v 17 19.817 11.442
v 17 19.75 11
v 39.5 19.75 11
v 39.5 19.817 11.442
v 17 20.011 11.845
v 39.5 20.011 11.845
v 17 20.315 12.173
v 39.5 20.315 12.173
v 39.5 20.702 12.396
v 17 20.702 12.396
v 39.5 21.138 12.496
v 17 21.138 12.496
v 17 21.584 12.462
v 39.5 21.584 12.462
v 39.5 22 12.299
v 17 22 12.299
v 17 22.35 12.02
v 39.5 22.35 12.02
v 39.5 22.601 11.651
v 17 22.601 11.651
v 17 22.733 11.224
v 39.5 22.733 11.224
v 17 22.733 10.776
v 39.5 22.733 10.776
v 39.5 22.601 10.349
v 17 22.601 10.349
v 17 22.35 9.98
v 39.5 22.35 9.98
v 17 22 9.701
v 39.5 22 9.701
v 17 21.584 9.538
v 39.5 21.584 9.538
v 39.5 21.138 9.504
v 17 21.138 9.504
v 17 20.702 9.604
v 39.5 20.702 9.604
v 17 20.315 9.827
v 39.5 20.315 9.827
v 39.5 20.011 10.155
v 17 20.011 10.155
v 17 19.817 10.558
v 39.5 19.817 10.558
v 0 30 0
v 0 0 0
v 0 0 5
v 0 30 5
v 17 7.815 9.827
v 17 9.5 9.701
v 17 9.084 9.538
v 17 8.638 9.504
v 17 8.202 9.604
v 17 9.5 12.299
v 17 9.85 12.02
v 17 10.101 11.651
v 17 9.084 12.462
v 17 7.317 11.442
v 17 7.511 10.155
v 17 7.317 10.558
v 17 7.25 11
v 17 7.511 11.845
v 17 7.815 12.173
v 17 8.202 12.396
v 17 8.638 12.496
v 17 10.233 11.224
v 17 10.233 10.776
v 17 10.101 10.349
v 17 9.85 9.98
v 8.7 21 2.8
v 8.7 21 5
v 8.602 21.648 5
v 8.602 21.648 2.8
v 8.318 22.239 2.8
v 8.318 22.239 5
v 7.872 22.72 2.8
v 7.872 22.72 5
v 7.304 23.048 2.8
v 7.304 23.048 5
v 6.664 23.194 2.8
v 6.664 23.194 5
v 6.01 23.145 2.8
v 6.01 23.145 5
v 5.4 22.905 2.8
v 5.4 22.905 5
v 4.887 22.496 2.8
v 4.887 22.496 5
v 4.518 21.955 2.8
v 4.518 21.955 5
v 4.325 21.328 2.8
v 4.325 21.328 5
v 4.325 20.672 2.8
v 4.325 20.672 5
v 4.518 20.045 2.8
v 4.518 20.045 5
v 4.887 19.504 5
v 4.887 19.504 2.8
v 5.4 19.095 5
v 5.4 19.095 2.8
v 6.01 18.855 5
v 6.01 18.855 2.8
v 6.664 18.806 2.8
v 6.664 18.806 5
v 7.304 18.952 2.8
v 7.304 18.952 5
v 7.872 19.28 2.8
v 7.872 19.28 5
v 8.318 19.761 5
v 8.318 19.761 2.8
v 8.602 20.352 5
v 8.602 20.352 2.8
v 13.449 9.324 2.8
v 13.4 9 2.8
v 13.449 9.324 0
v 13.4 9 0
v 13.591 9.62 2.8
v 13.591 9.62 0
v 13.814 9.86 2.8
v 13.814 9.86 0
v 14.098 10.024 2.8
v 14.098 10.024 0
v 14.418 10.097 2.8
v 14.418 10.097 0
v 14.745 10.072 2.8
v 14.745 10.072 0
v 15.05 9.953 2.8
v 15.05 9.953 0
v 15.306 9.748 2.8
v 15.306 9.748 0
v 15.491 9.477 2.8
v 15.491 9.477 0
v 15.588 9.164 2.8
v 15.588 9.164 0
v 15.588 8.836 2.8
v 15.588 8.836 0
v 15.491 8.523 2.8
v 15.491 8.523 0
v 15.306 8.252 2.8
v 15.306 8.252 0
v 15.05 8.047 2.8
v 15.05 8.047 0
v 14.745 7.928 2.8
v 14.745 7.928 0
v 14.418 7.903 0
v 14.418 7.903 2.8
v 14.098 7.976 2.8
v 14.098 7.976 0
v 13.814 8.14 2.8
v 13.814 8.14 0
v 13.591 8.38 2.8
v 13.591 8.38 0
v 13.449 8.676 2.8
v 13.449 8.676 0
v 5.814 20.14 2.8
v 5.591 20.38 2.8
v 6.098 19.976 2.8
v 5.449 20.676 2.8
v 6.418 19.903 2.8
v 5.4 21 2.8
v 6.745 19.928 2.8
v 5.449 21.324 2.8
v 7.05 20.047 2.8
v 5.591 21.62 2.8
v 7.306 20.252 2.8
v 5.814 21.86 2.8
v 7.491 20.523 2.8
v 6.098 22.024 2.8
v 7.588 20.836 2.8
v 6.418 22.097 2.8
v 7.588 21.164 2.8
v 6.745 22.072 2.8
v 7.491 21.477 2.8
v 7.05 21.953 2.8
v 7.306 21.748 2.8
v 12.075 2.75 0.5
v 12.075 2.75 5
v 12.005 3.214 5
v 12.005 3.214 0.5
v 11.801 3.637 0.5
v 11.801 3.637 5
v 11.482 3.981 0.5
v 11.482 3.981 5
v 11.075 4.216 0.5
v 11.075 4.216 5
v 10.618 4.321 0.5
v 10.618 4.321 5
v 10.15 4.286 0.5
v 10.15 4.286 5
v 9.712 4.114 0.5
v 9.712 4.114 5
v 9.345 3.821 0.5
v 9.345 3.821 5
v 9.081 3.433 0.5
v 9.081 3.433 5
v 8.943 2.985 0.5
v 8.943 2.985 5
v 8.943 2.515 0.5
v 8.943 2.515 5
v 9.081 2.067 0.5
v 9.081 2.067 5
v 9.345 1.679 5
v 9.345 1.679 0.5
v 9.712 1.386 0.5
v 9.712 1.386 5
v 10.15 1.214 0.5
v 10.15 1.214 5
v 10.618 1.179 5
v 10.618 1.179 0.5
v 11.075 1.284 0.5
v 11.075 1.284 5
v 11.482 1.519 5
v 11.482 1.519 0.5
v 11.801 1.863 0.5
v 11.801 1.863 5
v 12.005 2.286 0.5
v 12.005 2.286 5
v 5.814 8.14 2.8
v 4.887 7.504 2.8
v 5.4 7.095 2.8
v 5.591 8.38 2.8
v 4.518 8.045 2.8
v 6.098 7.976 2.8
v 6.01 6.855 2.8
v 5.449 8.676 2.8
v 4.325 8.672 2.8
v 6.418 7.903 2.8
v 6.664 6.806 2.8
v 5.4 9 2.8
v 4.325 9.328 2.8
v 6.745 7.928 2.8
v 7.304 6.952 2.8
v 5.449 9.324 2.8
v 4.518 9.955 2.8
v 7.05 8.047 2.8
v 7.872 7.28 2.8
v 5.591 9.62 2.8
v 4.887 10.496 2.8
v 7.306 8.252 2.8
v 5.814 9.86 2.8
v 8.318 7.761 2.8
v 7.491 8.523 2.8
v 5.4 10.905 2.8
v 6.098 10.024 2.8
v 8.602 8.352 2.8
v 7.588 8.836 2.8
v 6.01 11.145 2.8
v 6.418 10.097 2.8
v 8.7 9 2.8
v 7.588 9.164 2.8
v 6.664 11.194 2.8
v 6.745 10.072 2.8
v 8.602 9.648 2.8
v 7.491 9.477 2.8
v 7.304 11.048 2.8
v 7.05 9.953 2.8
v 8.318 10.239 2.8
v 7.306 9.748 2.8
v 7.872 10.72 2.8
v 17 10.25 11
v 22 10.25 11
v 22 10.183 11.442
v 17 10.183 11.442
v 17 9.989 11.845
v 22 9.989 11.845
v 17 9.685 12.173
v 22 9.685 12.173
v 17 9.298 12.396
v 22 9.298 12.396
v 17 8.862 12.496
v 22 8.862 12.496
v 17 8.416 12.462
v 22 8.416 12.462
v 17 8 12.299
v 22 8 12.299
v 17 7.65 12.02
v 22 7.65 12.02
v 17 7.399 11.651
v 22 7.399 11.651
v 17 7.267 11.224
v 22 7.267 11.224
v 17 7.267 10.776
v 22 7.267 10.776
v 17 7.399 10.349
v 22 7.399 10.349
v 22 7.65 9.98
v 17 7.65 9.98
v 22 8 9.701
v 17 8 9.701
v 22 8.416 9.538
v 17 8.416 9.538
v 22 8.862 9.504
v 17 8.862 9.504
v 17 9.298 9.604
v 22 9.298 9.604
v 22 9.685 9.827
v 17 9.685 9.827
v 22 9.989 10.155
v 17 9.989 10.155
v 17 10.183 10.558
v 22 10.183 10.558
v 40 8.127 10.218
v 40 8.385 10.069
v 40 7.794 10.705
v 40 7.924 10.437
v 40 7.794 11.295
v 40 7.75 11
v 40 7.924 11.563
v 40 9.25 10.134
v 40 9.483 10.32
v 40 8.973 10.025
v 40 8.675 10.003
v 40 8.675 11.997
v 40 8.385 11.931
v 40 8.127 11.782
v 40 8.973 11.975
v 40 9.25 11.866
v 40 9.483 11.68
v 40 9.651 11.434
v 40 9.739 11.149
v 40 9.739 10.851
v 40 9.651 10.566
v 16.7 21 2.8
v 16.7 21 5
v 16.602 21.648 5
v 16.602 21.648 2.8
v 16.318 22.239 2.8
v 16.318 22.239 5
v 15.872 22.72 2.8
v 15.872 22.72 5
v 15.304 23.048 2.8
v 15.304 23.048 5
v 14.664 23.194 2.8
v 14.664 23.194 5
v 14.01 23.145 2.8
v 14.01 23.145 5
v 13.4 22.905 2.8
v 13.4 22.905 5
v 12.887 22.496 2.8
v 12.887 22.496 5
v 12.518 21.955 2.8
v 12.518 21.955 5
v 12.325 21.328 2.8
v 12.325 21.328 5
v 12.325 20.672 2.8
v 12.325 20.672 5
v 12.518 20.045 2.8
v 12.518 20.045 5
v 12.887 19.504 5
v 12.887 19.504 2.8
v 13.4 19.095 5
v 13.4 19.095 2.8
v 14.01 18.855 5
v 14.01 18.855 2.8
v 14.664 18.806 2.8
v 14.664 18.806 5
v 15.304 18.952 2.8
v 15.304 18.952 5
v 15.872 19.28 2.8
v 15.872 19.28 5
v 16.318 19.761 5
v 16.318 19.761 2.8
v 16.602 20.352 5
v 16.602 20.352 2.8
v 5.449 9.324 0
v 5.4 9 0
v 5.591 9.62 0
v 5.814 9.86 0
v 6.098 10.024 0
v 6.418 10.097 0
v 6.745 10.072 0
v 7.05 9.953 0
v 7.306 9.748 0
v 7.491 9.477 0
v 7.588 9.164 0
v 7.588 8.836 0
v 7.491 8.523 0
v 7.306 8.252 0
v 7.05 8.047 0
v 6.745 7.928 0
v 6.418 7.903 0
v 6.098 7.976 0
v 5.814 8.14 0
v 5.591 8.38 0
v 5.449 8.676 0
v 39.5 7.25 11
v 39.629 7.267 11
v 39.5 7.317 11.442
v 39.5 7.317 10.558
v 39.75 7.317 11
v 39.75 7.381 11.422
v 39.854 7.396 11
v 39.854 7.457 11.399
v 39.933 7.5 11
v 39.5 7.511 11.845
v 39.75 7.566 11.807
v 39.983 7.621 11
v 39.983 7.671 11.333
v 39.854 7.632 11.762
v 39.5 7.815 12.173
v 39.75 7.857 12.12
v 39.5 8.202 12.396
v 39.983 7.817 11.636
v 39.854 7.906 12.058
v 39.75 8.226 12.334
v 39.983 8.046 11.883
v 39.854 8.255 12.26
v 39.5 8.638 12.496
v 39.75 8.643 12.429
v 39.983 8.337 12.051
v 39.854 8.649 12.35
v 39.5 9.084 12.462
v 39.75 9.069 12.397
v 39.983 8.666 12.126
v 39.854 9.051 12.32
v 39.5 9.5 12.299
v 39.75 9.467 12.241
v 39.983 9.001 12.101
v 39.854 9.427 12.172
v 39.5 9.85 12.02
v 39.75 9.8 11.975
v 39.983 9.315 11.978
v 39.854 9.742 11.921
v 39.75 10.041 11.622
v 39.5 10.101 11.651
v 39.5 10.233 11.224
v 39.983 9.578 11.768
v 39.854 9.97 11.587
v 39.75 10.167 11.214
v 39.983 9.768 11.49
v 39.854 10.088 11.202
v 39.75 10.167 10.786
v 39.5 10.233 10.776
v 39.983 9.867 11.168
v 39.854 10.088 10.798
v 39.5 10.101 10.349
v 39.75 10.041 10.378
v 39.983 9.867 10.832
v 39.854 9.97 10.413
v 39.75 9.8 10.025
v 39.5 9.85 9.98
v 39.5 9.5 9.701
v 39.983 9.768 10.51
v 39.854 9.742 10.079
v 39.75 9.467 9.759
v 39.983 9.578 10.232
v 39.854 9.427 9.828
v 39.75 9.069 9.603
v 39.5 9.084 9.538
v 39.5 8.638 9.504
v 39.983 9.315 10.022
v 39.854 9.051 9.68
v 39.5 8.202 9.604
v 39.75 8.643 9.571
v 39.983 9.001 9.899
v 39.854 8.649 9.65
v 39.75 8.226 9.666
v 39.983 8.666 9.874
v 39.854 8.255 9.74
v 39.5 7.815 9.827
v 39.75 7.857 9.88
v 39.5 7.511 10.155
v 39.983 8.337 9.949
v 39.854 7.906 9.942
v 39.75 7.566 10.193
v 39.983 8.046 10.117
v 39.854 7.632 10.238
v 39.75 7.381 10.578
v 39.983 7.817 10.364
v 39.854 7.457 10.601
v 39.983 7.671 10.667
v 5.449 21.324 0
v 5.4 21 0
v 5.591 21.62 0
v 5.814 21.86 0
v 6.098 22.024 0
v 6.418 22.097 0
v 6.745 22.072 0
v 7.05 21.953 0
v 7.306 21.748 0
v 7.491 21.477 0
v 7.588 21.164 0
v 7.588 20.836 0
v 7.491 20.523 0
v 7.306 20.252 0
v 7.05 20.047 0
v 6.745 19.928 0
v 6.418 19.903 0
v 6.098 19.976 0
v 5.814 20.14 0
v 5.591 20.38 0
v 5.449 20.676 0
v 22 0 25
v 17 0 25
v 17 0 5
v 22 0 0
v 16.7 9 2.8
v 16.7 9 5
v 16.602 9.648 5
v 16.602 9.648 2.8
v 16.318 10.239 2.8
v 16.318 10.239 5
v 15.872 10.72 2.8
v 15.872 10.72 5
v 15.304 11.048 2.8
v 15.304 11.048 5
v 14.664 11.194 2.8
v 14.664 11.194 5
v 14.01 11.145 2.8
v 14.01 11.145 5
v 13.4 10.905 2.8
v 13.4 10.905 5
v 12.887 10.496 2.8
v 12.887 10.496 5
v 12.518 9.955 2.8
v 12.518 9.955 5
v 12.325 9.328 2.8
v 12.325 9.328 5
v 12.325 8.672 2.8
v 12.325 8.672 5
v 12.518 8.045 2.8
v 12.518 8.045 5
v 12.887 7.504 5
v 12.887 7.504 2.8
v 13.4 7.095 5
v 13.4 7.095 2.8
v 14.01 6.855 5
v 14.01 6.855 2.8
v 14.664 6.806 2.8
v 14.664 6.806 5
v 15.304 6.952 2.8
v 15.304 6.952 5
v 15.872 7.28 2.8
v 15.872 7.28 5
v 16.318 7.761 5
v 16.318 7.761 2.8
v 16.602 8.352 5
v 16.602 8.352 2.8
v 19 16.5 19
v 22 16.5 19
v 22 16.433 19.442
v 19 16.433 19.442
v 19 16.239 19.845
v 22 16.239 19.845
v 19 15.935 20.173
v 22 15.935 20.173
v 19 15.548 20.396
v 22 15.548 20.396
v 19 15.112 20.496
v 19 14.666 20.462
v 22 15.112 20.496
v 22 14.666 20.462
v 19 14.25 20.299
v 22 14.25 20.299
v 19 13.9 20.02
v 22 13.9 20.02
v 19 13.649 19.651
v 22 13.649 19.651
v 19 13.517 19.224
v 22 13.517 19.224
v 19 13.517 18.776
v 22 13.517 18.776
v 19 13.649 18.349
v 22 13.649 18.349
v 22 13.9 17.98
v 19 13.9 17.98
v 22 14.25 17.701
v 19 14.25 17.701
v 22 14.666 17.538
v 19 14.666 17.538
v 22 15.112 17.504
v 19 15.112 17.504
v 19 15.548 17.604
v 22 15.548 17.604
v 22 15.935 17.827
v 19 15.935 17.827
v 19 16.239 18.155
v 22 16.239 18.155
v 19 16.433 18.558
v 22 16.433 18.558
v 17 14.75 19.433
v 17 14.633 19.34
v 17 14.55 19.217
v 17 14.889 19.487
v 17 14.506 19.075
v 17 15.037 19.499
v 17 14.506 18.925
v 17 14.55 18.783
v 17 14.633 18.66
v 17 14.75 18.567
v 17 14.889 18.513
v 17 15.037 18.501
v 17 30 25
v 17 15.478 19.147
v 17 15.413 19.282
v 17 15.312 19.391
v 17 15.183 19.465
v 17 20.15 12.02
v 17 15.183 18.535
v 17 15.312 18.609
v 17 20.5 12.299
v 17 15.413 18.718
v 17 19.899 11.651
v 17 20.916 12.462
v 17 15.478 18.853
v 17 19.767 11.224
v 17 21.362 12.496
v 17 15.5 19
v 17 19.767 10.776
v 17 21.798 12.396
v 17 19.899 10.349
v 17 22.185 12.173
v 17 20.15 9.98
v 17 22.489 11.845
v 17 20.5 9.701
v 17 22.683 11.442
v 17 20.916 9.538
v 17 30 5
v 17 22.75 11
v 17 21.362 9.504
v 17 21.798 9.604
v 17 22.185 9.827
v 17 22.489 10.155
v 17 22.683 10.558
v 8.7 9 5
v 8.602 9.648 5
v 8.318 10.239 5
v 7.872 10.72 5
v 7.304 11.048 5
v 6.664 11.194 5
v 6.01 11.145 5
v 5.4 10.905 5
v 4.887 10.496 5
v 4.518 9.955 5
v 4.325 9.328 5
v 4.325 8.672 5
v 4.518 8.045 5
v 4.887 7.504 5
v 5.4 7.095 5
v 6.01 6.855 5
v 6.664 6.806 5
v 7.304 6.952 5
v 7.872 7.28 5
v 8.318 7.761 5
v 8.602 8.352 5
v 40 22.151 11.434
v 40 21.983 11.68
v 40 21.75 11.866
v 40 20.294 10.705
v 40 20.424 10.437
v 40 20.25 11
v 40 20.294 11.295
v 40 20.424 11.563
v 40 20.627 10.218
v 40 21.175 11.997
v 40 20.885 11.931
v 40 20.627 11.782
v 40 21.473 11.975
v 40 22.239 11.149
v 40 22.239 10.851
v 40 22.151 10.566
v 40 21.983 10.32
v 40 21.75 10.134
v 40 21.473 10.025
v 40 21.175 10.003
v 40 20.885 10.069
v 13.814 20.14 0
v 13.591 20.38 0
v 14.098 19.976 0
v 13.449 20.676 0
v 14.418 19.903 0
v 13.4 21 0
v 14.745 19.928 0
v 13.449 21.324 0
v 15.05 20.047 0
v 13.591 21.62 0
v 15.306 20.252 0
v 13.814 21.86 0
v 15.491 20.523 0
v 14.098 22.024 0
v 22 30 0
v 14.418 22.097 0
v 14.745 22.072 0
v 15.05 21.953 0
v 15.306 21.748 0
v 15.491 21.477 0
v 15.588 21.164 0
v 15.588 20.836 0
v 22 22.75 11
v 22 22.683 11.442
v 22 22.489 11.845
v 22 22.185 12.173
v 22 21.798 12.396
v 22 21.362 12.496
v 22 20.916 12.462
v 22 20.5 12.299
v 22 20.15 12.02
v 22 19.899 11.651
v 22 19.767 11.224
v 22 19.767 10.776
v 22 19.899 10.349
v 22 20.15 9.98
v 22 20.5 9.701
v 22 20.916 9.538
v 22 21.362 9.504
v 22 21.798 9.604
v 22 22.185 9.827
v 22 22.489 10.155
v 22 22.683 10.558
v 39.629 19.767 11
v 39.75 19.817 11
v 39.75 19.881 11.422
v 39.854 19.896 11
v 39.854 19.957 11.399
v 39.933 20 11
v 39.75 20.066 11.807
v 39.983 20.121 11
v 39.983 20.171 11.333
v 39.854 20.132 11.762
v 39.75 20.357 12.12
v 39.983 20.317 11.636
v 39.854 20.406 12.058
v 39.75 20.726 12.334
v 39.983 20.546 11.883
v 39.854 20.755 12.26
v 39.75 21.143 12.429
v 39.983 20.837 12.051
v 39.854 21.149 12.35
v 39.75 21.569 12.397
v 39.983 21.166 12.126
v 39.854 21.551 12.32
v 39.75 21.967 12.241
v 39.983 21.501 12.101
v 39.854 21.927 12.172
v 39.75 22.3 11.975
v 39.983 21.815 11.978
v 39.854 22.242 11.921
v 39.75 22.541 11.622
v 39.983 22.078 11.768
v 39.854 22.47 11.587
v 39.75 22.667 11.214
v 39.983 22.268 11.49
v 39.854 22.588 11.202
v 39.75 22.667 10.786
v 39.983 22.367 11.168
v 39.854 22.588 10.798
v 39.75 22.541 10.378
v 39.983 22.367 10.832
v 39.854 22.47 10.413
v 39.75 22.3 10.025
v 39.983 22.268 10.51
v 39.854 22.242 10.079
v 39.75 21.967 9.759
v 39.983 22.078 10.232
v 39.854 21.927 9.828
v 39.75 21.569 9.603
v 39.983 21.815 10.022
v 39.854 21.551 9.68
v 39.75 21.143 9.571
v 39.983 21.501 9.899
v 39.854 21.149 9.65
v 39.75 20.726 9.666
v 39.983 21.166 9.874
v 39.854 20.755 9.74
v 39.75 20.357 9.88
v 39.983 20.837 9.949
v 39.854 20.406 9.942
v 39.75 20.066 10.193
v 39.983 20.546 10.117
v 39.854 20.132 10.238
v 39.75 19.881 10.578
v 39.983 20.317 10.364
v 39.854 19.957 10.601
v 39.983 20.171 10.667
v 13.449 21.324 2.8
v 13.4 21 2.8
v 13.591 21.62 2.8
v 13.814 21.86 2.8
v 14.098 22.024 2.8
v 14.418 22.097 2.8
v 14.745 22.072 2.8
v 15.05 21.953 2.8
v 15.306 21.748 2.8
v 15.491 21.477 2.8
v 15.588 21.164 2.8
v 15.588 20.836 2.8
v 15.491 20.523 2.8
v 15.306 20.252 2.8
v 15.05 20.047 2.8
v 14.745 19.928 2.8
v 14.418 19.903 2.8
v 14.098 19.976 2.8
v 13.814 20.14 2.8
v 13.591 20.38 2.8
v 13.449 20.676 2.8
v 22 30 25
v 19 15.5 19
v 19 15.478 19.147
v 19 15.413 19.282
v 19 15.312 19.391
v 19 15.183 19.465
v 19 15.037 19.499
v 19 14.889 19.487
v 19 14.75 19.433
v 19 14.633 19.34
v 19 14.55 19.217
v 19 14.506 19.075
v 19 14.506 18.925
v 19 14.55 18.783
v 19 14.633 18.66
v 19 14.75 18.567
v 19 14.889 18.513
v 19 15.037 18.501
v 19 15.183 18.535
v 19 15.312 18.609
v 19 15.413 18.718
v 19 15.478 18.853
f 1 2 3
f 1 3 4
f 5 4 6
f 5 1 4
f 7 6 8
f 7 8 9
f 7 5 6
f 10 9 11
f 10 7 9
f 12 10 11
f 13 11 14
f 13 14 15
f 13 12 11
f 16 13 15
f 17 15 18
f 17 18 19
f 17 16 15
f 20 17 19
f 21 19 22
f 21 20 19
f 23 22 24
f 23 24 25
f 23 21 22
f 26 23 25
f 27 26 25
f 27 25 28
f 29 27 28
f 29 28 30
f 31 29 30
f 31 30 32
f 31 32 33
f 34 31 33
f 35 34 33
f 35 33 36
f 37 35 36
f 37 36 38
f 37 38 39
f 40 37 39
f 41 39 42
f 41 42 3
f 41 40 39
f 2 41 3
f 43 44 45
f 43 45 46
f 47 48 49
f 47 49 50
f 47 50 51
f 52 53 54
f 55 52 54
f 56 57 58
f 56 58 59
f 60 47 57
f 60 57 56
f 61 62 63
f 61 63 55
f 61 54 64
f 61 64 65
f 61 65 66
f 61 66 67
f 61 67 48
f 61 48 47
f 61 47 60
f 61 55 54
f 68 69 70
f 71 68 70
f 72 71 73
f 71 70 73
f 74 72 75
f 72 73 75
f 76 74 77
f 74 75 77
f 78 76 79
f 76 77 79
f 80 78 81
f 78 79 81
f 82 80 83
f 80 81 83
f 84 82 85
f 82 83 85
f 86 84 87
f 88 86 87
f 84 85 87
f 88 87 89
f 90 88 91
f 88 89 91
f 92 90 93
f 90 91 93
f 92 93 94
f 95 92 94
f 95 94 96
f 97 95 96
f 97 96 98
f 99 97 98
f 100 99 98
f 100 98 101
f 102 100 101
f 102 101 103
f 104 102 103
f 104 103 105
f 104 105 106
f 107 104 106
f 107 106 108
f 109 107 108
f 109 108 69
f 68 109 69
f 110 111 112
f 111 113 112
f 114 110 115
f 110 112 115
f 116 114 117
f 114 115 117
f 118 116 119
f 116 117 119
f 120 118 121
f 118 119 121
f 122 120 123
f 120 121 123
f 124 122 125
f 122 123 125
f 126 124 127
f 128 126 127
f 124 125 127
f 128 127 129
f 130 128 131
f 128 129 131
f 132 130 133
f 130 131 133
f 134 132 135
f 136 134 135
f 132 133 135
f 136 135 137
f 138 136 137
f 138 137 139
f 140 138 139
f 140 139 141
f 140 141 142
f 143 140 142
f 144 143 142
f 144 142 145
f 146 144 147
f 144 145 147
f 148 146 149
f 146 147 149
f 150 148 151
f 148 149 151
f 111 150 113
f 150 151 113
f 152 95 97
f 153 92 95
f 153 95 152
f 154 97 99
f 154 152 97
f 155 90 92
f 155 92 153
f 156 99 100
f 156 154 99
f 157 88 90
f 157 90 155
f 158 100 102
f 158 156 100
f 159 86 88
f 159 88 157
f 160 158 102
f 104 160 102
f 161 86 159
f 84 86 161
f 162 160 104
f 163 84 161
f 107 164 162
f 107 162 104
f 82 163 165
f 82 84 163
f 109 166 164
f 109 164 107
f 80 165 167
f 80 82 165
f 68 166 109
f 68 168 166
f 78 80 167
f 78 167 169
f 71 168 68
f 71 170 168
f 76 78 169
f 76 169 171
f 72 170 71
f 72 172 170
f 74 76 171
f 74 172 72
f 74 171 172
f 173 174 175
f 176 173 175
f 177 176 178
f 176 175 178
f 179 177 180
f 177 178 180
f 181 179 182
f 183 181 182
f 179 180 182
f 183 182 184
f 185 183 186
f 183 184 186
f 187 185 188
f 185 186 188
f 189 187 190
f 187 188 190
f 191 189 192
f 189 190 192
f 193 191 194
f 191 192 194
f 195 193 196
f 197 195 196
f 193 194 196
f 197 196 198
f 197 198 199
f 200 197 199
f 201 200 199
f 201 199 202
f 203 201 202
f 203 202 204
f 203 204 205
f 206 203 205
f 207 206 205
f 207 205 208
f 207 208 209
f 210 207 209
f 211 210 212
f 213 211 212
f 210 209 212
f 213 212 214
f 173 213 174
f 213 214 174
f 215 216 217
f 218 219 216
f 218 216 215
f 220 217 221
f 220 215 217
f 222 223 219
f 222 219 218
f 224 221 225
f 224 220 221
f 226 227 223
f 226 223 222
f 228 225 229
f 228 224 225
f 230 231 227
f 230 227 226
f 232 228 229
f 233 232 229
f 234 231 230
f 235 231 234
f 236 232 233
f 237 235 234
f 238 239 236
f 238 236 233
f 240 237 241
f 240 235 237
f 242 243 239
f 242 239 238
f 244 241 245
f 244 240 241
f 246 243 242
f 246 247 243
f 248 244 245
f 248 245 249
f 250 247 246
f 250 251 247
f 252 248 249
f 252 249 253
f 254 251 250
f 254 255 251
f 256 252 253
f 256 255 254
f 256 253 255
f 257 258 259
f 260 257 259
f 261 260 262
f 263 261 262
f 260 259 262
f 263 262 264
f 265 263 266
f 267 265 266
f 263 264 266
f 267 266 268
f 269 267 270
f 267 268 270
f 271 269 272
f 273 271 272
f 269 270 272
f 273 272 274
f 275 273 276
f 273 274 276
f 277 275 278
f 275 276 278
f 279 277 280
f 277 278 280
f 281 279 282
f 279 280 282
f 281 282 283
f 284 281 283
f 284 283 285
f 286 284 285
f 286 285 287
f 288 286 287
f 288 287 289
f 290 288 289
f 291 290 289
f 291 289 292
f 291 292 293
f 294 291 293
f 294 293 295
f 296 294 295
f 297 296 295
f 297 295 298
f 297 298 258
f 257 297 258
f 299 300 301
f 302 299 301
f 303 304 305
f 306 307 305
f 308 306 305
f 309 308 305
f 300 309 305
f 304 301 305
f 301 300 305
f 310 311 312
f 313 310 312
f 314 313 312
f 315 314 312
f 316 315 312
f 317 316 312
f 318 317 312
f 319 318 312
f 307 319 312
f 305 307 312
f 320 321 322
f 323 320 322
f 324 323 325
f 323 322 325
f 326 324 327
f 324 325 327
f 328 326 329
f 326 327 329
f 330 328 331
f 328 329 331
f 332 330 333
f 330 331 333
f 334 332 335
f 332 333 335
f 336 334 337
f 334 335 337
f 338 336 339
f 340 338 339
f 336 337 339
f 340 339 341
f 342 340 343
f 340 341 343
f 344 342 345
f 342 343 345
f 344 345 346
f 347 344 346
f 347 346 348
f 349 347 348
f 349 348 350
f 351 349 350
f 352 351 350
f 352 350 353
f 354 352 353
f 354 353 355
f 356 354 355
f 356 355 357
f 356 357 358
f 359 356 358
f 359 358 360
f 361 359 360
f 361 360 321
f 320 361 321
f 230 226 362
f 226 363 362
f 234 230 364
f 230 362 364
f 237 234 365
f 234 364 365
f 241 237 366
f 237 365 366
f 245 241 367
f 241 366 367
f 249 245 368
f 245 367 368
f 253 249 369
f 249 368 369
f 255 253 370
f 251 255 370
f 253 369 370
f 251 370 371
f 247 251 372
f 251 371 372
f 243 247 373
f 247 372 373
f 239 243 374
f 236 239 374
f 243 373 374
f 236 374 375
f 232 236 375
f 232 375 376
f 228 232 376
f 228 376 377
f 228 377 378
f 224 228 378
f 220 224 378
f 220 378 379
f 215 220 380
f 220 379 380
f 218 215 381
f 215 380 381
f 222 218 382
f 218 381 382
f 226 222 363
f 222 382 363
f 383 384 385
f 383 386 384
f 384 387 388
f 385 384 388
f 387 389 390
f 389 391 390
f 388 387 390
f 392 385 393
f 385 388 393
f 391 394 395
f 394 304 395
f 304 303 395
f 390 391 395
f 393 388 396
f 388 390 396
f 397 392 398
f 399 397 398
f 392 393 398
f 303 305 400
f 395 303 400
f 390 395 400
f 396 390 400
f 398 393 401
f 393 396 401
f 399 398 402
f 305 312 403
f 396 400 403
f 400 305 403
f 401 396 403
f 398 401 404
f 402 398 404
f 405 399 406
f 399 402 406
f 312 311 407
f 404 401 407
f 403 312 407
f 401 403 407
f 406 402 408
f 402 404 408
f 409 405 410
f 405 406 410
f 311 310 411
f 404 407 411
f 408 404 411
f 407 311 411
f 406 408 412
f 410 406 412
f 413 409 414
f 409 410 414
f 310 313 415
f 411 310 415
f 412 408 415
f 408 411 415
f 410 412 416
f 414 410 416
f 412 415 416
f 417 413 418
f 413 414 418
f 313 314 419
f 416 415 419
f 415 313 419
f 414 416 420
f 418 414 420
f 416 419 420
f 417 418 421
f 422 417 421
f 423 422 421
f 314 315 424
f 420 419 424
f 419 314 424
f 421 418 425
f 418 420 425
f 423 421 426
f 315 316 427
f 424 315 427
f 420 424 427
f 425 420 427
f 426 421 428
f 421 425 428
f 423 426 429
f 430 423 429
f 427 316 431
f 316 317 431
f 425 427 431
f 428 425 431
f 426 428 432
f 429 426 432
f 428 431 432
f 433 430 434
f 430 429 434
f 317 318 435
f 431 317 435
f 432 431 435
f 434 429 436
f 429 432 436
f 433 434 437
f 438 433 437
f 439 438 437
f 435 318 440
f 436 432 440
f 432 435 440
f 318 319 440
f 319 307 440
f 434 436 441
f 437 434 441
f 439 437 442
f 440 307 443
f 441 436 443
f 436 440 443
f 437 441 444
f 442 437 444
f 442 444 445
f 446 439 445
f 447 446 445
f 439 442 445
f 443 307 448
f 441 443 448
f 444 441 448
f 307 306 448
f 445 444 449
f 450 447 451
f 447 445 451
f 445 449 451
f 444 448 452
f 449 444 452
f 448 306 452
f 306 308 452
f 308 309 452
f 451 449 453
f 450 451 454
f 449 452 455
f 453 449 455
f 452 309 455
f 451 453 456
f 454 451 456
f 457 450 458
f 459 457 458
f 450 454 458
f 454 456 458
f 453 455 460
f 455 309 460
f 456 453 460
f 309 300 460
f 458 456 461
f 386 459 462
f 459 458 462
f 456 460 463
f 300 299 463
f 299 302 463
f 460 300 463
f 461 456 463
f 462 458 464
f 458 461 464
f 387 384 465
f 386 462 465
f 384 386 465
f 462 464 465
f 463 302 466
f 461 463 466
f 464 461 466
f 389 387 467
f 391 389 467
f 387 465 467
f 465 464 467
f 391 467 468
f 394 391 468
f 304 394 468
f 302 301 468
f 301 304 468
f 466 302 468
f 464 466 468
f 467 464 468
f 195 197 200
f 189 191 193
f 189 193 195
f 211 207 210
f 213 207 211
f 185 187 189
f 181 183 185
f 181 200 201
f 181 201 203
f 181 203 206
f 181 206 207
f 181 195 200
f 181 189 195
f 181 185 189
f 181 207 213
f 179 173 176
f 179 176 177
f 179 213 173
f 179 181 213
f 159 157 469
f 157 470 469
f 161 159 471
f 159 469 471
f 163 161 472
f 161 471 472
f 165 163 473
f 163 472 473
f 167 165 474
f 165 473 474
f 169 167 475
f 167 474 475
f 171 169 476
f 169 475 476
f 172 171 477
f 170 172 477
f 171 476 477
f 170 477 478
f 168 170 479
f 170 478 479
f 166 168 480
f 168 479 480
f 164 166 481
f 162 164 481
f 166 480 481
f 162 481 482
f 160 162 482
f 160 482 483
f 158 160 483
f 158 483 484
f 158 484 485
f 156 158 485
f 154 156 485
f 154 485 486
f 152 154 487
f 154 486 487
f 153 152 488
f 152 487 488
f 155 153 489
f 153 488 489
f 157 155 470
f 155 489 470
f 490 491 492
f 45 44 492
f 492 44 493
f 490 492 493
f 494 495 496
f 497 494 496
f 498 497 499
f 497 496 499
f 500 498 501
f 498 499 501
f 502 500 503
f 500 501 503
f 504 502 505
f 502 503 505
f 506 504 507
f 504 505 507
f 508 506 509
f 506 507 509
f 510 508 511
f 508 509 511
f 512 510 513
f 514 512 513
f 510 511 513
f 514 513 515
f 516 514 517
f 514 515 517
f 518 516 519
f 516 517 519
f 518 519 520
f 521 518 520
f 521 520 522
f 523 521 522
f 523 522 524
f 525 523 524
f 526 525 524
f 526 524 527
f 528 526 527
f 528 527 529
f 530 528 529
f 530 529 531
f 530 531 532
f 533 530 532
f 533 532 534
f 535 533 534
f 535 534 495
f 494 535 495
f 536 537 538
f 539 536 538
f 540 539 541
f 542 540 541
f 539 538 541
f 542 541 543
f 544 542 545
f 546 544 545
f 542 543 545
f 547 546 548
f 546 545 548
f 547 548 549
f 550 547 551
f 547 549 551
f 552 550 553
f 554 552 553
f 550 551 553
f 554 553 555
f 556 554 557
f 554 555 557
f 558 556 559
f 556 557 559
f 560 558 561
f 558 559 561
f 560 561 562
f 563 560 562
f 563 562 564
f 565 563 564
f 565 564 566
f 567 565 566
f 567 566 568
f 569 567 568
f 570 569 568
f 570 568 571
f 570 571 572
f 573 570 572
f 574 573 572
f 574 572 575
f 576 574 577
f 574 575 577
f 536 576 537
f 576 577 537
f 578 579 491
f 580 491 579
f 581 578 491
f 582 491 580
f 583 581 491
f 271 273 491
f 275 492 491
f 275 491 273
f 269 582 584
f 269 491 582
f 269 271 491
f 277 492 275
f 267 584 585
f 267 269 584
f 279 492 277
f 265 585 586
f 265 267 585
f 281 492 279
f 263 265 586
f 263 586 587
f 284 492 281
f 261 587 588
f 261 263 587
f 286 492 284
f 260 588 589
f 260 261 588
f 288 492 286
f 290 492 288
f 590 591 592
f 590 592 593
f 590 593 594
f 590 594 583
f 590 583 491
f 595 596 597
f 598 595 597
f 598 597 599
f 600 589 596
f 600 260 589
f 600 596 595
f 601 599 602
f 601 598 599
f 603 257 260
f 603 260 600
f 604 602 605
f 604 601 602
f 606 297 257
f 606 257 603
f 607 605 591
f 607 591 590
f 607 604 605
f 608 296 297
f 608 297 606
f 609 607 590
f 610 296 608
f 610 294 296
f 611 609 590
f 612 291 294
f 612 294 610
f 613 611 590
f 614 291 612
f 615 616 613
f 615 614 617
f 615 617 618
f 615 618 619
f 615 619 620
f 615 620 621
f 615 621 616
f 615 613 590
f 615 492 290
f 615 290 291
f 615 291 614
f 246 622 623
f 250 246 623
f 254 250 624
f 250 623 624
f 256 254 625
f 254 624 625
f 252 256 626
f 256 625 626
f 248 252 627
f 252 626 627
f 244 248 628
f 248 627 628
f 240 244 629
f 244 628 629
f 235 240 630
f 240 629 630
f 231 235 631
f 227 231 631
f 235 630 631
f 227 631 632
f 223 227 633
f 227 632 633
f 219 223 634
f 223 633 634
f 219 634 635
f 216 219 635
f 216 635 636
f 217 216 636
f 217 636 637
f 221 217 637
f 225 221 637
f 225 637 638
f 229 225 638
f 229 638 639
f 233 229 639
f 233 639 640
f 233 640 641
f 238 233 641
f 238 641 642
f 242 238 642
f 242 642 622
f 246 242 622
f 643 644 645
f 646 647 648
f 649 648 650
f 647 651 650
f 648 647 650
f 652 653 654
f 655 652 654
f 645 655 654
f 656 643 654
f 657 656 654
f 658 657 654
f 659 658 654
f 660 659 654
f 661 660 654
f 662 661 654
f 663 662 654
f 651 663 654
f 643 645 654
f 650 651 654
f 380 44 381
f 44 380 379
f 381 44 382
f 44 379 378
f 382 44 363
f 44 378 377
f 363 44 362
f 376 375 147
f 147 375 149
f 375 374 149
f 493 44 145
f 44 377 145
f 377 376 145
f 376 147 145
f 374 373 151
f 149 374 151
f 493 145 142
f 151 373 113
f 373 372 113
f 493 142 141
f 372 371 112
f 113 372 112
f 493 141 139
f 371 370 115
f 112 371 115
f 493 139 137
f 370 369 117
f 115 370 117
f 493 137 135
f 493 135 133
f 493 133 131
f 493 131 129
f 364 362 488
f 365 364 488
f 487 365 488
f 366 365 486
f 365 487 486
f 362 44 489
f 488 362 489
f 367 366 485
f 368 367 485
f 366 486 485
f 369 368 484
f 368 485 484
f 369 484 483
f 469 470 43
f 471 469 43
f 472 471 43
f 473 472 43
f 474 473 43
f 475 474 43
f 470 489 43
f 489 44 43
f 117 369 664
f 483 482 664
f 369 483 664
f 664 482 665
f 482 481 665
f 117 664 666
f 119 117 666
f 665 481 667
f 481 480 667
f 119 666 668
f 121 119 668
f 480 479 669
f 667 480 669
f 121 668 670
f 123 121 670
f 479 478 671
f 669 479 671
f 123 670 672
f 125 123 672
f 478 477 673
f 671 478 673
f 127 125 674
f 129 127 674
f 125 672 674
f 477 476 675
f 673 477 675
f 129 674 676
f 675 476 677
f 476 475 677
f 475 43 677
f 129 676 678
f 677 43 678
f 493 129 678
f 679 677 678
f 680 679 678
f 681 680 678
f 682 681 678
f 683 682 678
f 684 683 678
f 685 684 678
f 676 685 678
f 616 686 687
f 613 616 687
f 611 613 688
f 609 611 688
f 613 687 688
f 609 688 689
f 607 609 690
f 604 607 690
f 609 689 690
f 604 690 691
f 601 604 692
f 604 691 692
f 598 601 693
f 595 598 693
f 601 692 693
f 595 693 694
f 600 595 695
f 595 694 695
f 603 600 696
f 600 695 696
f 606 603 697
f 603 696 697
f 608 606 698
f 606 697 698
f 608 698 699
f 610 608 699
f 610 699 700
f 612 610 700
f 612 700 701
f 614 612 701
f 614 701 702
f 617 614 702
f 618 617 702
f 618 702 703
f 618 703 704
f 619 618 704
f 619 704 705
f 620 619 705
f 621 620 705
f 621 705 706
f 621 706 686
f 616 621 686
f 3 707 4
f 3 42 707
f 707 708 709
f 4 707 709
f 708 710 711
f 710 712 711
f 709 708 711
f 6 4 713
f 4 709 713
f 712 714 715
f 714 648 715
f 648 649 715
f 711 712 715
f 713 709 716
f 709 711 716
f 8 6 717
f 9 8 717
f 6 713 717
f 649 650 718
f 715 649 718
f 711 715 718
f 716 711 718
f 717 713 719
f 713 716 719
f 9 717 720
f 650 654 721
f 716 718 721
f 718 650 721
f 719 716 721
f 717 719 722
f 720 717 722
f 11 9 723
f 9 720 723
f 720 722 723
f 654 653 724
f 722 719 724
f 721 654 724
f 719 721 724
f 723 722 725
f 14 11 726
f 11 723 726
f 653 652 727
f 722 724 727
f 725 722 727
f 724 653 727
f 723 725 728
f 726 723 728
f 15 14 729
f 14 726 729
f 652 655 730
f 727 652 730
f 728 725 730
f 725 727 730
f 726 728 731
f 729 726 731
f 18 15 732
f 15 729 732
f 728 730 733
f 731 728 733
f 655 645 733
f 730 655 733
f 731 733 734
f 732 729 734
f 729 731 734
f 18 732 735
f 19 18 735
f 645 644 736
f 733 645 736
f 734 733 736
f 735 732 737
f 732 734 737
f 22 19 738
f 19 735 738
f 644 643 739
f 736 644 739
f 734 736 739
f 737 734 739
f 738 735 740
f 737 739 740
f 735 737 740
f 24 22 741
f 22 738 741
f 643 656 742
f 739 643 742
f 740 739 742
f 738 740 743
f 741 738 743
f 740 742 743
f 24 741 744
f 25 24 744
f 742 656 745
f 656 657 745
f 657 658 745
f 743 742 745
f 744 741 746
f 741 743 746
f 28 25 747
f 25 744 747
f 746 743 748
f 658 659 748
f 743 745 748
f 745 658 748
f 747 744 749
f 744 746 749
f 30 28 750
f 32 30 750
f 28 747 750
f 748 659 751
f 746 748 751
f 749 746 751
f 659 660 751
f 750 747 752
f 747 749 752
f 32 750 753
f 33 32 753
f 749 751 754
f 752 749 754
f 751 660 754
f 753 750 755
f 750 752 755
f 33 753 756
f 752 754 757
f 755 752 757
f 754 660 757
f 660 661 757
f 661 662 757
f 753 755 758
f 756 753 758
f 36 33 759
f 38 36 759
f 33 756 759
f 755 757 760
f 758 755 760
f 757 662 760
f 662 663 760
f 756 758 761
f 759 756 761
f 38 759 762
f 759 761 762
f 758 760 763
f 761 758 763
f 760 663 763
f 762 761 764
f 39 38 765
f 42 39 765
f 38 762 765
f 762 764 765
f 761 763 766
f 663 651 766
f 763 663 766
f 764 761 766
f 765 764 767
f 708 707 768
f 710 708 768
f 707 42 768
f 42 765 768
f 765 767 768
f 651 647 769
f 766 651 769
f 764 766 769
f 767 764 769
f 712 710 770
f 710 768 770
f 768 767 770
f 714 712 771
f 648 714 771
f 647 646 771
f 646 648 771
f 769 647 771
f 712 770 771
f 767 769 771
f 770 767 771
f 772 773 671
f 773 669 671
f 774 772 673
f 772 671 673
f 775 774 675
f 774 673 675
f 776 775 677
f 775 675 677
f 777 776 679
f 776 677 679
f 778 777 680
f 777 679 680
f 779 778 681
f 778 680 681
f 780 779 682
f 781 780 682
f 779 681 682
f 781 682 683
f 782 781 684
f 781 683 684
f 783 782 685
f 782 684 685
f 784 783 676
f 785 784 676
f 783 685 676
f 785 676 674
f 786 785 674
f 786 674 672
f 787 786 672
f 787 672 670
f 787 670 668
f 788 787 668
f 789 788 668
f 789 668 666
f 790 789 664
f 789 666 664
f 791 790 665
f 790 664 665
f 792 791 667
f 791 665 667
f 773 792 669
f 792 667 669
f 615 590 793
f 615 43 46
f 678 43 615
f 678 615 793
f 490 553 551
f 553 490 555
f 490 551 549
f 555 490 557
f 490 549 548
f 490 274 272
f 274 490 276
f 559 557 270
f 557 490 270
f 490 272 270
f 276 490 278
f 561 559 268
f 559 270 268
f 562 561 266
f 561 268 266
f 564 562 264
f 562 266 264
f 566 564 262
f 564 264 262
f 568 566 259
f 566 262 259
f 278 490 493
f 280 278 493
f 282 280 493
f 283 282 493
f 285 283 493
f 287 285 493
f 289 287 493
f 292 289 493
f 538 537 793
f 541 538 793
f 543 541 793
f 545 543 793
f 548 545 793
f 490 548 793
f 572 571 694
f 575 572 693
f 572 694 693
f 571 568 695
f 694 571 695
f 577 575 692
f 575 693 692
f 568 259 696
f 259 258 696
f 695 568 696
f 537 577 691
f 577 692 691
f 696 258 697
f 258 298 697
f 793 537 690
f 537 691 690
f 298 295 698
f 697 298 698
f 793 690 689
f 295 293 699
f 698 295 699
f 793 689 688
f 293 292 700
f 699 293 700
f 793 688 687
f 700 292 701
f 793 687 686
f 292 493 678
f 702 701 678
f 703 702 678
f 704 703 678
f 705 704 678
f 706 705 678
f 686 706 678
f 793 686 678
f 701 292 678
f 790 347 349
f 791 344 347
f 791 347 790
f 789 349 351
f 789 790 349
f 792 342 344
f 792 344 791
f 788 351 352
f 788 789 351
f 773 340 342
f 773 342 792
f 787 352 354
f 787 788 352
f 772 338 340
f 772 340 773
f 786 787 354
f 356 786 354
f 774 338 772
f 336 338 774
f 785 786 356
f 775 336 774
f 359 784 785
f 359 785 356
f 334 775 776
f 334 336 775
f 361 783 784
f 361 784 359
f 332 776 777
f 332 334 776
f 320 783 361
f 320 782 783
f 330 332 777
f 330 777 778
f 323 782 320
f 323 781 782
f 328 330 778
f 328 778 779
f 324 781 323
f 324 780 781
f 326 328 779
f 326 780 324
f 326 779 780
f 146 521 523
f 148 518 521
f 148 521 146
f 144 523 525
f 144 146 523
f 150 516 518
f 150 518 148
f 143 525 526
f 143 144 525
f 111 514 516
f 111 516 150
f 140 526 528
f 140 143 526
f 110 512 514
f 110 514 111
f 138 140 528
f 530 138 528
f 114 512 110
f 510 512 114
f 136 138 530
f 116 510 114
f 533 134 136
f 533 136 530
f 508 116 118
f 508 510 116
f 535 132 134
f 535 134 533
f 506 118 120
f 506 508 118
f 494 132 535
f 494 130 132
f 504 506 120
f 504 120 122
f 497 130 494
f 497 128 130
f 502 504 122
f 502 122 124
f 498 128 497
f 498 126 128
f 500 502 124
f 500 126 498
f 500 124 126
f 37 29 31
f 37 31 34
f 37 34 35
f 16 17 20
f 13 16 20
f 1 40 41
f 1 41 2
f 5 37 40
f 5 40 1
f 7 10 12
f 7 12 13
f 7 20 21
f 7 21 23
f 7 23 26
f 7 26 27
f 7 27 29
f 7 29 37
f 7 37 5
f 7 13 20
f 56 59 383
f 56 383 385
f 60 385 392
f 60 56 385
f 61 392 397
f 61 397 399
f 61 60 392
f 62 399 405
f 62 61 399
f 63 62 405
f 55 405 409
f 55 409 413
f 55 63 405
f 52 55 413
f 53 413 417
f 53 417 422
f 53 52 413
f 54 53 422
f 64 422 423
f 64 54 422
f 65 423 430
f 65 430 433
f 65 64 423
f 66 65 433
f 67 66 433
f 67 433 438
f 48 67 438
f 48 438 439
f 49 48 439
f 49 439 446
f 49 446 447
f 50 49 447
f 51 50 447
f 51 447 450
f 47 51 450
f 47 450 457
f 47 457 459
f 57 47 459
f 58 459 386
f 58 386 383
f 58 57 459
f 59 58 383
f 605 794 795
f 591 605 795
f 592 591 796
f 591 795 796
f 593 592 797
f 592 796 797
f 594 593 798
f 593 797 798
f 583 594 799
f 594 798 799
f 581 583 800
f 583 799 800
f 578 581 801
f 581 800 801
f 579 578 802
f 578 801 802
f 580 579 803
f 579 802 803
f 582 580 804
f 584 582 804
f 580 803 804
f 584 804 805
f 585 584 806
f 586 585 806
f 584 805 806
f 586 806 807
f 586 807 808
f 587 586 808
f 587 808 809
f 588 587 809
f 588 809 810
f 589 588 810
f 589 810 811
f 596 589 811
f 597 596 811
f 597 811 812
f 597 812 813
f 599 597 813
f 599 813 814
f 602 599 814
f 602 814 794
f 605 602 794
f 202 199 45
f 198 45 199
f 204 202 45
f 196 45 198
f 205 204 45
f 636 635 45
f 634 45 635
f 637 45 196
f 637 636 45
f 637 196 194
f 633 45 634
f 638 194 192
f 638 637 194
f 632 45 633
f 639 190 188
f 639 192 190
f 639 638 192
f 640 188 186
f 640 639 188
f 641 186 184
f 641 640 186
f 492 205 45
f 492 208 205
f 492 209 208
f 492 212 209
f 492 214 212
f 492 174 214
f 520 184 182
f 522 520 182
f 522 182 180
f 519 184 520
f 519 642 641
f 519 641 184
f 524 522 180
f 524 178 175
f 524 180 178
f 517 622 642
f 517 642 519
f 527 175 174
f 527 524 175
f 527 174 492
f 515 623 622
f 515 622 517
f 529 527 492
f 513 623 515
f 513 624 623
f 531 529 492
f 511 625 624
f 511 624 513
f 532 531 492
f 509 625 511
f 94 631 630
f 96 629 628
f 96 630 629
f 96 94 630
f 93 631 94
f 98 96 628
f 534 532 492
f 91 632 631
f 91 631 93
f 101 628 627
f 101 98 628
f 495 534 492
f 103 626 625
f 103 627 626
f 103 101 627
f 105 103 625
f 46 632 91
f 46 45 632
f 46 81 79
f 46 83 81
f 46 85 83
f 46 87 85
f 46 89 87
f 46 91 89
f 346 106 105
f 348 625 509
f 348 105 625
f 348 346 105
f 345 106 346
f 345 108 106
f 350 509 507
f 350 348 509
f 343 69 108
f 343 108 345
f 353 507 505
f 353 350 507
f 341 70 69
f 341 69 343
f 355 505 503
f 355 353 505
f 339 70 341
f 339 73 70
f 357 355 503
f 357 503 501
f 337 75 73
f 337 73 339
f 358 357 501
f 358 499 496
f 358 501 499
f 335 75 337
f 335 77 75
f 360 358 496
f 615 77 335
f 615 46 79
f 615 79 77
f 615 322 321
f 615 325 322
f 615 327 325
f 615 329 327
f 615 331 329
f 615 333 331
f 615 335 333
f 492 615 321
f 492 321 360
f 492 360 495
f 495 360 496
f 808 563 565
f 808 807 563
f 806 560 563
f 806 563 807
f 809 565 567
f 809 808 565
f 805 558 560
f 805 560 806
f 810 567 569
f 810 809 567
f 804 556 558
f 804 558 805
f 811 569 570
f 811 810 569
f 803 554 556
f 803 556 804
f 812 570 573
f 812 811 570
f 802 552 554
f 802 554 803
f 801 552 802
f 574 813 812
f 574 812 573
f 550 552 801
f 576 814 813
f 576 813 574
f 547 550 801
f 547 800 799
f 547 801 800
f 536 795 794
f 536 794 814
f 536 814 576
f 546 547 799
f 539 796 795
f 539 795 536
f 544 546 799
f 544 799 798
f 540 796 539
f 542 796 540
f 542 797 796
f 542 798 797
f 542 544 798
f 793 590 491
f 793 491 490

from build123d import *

# Parameters (mm, degrees)
F0_W           = 22
F0_H           = 30
F1_DEPTH       = 5
F2_W           = 5
F2_H           = 30
F3_DEPTH       = 20
F5_D           = 2.2
F5_CBORE_D     = 4.4
F5_CBORE_DEPTH = 2.2
F6_R           = 1.5
F7_DEPTH       = 25
F8_R           = 1.5
F9_DEPTH       = 23
F10_R          = 0.5
F11_R          = 1.575
F12_DEPTH      = 4.5
F13_R          = 1.5
F14_DEPTH      = 3
F15_R          = 0.5
F16_DEPTH      = 25


with BuildPart() as f1:
    # F0 (on Top) → F1 (new body)
    with BuildSketch(Plane.XY):
        with Locations((11, 15)):
            Rectangle(F0_W, F0_H)
    extrude(amount=F1_DEPTH)

    # F2 (on face) → F3 (join)
    with BuildSketch(Plane.XY.offset(5)):
        with Locations((19.5, 15)):
            Rectangle(F2_W, F2_H)
    extrude(amount=F3_DEPTH)

    # F5 (through all)
    with Locations(Plane.XY.offset(5)):
        with Locations((6.5, 9), (6.5, 21), (14.5, 21), (14.5, 9)):
            CounterBoreHole(F5_D / 2, F5_CBORE_D / 2, F5_CBORE_DEPTH)

    # F6 (on face) → F7 (cut)
    with BuildSketch(Plane.YZ.offset(22)):
        with Locations((8.75, 11)):
            Circle(F6_R)
        with Locations((21.25, 11)):
            Circle(F6_R)
    extrude(amount=-F7_DEPTH, mode=Mode.SUBTRACT)

    # F11 (on face) → F12 (cut)
    with BuildSketch(Plane.XY.offset(5)):
        with Locations((10.5, 2.75)):
            Circle(F11_R)
    extrude(amount=-F12_DEPTH, mode=Mode.SUBTRACT)

    # F13 (on face) → F14 (cut)
    with BuildSketch(Plane.YZ.offset(22)):
        with Locations((15, 19)):
            Circle(F13_R)
    extrude(amount=-F14_DEPTH, mode=Mode.SUBTRACT)

    # F15 (on face) → F16 (cut)
    with BuildSketch(Plane.YZ.offset(19)):
        with Locations((15, 19)):
            Circle(F15_R)
    extrude(amount=-F16_DEPTH, mode=Mode.SUBTRACT)


with BuildPart() as f9:
    # F8 (on face) → F9 (new body)
    with BuildSketch(Plane(origin=(17, 0, 0), x_dir=(0, -1, 0), z_dir=(-1, 0, 0))):
        with Locations((-8.75, 11)):
            Circle(F8_R)
        with Locations((-21.25, 11)):
            Circle(F8_R)
    extrude(amount=-F9_DEPTH)

    # F10
    f10_edges = [f9.edges().sort_by_distance(p)[0] for p in [
        (40, 10.25, 11),
        (40, 22.75, 11),
    ]]
    fillet(f10_edges, radius=F10_R)


solid = Compound([f1.part, f9.part])
